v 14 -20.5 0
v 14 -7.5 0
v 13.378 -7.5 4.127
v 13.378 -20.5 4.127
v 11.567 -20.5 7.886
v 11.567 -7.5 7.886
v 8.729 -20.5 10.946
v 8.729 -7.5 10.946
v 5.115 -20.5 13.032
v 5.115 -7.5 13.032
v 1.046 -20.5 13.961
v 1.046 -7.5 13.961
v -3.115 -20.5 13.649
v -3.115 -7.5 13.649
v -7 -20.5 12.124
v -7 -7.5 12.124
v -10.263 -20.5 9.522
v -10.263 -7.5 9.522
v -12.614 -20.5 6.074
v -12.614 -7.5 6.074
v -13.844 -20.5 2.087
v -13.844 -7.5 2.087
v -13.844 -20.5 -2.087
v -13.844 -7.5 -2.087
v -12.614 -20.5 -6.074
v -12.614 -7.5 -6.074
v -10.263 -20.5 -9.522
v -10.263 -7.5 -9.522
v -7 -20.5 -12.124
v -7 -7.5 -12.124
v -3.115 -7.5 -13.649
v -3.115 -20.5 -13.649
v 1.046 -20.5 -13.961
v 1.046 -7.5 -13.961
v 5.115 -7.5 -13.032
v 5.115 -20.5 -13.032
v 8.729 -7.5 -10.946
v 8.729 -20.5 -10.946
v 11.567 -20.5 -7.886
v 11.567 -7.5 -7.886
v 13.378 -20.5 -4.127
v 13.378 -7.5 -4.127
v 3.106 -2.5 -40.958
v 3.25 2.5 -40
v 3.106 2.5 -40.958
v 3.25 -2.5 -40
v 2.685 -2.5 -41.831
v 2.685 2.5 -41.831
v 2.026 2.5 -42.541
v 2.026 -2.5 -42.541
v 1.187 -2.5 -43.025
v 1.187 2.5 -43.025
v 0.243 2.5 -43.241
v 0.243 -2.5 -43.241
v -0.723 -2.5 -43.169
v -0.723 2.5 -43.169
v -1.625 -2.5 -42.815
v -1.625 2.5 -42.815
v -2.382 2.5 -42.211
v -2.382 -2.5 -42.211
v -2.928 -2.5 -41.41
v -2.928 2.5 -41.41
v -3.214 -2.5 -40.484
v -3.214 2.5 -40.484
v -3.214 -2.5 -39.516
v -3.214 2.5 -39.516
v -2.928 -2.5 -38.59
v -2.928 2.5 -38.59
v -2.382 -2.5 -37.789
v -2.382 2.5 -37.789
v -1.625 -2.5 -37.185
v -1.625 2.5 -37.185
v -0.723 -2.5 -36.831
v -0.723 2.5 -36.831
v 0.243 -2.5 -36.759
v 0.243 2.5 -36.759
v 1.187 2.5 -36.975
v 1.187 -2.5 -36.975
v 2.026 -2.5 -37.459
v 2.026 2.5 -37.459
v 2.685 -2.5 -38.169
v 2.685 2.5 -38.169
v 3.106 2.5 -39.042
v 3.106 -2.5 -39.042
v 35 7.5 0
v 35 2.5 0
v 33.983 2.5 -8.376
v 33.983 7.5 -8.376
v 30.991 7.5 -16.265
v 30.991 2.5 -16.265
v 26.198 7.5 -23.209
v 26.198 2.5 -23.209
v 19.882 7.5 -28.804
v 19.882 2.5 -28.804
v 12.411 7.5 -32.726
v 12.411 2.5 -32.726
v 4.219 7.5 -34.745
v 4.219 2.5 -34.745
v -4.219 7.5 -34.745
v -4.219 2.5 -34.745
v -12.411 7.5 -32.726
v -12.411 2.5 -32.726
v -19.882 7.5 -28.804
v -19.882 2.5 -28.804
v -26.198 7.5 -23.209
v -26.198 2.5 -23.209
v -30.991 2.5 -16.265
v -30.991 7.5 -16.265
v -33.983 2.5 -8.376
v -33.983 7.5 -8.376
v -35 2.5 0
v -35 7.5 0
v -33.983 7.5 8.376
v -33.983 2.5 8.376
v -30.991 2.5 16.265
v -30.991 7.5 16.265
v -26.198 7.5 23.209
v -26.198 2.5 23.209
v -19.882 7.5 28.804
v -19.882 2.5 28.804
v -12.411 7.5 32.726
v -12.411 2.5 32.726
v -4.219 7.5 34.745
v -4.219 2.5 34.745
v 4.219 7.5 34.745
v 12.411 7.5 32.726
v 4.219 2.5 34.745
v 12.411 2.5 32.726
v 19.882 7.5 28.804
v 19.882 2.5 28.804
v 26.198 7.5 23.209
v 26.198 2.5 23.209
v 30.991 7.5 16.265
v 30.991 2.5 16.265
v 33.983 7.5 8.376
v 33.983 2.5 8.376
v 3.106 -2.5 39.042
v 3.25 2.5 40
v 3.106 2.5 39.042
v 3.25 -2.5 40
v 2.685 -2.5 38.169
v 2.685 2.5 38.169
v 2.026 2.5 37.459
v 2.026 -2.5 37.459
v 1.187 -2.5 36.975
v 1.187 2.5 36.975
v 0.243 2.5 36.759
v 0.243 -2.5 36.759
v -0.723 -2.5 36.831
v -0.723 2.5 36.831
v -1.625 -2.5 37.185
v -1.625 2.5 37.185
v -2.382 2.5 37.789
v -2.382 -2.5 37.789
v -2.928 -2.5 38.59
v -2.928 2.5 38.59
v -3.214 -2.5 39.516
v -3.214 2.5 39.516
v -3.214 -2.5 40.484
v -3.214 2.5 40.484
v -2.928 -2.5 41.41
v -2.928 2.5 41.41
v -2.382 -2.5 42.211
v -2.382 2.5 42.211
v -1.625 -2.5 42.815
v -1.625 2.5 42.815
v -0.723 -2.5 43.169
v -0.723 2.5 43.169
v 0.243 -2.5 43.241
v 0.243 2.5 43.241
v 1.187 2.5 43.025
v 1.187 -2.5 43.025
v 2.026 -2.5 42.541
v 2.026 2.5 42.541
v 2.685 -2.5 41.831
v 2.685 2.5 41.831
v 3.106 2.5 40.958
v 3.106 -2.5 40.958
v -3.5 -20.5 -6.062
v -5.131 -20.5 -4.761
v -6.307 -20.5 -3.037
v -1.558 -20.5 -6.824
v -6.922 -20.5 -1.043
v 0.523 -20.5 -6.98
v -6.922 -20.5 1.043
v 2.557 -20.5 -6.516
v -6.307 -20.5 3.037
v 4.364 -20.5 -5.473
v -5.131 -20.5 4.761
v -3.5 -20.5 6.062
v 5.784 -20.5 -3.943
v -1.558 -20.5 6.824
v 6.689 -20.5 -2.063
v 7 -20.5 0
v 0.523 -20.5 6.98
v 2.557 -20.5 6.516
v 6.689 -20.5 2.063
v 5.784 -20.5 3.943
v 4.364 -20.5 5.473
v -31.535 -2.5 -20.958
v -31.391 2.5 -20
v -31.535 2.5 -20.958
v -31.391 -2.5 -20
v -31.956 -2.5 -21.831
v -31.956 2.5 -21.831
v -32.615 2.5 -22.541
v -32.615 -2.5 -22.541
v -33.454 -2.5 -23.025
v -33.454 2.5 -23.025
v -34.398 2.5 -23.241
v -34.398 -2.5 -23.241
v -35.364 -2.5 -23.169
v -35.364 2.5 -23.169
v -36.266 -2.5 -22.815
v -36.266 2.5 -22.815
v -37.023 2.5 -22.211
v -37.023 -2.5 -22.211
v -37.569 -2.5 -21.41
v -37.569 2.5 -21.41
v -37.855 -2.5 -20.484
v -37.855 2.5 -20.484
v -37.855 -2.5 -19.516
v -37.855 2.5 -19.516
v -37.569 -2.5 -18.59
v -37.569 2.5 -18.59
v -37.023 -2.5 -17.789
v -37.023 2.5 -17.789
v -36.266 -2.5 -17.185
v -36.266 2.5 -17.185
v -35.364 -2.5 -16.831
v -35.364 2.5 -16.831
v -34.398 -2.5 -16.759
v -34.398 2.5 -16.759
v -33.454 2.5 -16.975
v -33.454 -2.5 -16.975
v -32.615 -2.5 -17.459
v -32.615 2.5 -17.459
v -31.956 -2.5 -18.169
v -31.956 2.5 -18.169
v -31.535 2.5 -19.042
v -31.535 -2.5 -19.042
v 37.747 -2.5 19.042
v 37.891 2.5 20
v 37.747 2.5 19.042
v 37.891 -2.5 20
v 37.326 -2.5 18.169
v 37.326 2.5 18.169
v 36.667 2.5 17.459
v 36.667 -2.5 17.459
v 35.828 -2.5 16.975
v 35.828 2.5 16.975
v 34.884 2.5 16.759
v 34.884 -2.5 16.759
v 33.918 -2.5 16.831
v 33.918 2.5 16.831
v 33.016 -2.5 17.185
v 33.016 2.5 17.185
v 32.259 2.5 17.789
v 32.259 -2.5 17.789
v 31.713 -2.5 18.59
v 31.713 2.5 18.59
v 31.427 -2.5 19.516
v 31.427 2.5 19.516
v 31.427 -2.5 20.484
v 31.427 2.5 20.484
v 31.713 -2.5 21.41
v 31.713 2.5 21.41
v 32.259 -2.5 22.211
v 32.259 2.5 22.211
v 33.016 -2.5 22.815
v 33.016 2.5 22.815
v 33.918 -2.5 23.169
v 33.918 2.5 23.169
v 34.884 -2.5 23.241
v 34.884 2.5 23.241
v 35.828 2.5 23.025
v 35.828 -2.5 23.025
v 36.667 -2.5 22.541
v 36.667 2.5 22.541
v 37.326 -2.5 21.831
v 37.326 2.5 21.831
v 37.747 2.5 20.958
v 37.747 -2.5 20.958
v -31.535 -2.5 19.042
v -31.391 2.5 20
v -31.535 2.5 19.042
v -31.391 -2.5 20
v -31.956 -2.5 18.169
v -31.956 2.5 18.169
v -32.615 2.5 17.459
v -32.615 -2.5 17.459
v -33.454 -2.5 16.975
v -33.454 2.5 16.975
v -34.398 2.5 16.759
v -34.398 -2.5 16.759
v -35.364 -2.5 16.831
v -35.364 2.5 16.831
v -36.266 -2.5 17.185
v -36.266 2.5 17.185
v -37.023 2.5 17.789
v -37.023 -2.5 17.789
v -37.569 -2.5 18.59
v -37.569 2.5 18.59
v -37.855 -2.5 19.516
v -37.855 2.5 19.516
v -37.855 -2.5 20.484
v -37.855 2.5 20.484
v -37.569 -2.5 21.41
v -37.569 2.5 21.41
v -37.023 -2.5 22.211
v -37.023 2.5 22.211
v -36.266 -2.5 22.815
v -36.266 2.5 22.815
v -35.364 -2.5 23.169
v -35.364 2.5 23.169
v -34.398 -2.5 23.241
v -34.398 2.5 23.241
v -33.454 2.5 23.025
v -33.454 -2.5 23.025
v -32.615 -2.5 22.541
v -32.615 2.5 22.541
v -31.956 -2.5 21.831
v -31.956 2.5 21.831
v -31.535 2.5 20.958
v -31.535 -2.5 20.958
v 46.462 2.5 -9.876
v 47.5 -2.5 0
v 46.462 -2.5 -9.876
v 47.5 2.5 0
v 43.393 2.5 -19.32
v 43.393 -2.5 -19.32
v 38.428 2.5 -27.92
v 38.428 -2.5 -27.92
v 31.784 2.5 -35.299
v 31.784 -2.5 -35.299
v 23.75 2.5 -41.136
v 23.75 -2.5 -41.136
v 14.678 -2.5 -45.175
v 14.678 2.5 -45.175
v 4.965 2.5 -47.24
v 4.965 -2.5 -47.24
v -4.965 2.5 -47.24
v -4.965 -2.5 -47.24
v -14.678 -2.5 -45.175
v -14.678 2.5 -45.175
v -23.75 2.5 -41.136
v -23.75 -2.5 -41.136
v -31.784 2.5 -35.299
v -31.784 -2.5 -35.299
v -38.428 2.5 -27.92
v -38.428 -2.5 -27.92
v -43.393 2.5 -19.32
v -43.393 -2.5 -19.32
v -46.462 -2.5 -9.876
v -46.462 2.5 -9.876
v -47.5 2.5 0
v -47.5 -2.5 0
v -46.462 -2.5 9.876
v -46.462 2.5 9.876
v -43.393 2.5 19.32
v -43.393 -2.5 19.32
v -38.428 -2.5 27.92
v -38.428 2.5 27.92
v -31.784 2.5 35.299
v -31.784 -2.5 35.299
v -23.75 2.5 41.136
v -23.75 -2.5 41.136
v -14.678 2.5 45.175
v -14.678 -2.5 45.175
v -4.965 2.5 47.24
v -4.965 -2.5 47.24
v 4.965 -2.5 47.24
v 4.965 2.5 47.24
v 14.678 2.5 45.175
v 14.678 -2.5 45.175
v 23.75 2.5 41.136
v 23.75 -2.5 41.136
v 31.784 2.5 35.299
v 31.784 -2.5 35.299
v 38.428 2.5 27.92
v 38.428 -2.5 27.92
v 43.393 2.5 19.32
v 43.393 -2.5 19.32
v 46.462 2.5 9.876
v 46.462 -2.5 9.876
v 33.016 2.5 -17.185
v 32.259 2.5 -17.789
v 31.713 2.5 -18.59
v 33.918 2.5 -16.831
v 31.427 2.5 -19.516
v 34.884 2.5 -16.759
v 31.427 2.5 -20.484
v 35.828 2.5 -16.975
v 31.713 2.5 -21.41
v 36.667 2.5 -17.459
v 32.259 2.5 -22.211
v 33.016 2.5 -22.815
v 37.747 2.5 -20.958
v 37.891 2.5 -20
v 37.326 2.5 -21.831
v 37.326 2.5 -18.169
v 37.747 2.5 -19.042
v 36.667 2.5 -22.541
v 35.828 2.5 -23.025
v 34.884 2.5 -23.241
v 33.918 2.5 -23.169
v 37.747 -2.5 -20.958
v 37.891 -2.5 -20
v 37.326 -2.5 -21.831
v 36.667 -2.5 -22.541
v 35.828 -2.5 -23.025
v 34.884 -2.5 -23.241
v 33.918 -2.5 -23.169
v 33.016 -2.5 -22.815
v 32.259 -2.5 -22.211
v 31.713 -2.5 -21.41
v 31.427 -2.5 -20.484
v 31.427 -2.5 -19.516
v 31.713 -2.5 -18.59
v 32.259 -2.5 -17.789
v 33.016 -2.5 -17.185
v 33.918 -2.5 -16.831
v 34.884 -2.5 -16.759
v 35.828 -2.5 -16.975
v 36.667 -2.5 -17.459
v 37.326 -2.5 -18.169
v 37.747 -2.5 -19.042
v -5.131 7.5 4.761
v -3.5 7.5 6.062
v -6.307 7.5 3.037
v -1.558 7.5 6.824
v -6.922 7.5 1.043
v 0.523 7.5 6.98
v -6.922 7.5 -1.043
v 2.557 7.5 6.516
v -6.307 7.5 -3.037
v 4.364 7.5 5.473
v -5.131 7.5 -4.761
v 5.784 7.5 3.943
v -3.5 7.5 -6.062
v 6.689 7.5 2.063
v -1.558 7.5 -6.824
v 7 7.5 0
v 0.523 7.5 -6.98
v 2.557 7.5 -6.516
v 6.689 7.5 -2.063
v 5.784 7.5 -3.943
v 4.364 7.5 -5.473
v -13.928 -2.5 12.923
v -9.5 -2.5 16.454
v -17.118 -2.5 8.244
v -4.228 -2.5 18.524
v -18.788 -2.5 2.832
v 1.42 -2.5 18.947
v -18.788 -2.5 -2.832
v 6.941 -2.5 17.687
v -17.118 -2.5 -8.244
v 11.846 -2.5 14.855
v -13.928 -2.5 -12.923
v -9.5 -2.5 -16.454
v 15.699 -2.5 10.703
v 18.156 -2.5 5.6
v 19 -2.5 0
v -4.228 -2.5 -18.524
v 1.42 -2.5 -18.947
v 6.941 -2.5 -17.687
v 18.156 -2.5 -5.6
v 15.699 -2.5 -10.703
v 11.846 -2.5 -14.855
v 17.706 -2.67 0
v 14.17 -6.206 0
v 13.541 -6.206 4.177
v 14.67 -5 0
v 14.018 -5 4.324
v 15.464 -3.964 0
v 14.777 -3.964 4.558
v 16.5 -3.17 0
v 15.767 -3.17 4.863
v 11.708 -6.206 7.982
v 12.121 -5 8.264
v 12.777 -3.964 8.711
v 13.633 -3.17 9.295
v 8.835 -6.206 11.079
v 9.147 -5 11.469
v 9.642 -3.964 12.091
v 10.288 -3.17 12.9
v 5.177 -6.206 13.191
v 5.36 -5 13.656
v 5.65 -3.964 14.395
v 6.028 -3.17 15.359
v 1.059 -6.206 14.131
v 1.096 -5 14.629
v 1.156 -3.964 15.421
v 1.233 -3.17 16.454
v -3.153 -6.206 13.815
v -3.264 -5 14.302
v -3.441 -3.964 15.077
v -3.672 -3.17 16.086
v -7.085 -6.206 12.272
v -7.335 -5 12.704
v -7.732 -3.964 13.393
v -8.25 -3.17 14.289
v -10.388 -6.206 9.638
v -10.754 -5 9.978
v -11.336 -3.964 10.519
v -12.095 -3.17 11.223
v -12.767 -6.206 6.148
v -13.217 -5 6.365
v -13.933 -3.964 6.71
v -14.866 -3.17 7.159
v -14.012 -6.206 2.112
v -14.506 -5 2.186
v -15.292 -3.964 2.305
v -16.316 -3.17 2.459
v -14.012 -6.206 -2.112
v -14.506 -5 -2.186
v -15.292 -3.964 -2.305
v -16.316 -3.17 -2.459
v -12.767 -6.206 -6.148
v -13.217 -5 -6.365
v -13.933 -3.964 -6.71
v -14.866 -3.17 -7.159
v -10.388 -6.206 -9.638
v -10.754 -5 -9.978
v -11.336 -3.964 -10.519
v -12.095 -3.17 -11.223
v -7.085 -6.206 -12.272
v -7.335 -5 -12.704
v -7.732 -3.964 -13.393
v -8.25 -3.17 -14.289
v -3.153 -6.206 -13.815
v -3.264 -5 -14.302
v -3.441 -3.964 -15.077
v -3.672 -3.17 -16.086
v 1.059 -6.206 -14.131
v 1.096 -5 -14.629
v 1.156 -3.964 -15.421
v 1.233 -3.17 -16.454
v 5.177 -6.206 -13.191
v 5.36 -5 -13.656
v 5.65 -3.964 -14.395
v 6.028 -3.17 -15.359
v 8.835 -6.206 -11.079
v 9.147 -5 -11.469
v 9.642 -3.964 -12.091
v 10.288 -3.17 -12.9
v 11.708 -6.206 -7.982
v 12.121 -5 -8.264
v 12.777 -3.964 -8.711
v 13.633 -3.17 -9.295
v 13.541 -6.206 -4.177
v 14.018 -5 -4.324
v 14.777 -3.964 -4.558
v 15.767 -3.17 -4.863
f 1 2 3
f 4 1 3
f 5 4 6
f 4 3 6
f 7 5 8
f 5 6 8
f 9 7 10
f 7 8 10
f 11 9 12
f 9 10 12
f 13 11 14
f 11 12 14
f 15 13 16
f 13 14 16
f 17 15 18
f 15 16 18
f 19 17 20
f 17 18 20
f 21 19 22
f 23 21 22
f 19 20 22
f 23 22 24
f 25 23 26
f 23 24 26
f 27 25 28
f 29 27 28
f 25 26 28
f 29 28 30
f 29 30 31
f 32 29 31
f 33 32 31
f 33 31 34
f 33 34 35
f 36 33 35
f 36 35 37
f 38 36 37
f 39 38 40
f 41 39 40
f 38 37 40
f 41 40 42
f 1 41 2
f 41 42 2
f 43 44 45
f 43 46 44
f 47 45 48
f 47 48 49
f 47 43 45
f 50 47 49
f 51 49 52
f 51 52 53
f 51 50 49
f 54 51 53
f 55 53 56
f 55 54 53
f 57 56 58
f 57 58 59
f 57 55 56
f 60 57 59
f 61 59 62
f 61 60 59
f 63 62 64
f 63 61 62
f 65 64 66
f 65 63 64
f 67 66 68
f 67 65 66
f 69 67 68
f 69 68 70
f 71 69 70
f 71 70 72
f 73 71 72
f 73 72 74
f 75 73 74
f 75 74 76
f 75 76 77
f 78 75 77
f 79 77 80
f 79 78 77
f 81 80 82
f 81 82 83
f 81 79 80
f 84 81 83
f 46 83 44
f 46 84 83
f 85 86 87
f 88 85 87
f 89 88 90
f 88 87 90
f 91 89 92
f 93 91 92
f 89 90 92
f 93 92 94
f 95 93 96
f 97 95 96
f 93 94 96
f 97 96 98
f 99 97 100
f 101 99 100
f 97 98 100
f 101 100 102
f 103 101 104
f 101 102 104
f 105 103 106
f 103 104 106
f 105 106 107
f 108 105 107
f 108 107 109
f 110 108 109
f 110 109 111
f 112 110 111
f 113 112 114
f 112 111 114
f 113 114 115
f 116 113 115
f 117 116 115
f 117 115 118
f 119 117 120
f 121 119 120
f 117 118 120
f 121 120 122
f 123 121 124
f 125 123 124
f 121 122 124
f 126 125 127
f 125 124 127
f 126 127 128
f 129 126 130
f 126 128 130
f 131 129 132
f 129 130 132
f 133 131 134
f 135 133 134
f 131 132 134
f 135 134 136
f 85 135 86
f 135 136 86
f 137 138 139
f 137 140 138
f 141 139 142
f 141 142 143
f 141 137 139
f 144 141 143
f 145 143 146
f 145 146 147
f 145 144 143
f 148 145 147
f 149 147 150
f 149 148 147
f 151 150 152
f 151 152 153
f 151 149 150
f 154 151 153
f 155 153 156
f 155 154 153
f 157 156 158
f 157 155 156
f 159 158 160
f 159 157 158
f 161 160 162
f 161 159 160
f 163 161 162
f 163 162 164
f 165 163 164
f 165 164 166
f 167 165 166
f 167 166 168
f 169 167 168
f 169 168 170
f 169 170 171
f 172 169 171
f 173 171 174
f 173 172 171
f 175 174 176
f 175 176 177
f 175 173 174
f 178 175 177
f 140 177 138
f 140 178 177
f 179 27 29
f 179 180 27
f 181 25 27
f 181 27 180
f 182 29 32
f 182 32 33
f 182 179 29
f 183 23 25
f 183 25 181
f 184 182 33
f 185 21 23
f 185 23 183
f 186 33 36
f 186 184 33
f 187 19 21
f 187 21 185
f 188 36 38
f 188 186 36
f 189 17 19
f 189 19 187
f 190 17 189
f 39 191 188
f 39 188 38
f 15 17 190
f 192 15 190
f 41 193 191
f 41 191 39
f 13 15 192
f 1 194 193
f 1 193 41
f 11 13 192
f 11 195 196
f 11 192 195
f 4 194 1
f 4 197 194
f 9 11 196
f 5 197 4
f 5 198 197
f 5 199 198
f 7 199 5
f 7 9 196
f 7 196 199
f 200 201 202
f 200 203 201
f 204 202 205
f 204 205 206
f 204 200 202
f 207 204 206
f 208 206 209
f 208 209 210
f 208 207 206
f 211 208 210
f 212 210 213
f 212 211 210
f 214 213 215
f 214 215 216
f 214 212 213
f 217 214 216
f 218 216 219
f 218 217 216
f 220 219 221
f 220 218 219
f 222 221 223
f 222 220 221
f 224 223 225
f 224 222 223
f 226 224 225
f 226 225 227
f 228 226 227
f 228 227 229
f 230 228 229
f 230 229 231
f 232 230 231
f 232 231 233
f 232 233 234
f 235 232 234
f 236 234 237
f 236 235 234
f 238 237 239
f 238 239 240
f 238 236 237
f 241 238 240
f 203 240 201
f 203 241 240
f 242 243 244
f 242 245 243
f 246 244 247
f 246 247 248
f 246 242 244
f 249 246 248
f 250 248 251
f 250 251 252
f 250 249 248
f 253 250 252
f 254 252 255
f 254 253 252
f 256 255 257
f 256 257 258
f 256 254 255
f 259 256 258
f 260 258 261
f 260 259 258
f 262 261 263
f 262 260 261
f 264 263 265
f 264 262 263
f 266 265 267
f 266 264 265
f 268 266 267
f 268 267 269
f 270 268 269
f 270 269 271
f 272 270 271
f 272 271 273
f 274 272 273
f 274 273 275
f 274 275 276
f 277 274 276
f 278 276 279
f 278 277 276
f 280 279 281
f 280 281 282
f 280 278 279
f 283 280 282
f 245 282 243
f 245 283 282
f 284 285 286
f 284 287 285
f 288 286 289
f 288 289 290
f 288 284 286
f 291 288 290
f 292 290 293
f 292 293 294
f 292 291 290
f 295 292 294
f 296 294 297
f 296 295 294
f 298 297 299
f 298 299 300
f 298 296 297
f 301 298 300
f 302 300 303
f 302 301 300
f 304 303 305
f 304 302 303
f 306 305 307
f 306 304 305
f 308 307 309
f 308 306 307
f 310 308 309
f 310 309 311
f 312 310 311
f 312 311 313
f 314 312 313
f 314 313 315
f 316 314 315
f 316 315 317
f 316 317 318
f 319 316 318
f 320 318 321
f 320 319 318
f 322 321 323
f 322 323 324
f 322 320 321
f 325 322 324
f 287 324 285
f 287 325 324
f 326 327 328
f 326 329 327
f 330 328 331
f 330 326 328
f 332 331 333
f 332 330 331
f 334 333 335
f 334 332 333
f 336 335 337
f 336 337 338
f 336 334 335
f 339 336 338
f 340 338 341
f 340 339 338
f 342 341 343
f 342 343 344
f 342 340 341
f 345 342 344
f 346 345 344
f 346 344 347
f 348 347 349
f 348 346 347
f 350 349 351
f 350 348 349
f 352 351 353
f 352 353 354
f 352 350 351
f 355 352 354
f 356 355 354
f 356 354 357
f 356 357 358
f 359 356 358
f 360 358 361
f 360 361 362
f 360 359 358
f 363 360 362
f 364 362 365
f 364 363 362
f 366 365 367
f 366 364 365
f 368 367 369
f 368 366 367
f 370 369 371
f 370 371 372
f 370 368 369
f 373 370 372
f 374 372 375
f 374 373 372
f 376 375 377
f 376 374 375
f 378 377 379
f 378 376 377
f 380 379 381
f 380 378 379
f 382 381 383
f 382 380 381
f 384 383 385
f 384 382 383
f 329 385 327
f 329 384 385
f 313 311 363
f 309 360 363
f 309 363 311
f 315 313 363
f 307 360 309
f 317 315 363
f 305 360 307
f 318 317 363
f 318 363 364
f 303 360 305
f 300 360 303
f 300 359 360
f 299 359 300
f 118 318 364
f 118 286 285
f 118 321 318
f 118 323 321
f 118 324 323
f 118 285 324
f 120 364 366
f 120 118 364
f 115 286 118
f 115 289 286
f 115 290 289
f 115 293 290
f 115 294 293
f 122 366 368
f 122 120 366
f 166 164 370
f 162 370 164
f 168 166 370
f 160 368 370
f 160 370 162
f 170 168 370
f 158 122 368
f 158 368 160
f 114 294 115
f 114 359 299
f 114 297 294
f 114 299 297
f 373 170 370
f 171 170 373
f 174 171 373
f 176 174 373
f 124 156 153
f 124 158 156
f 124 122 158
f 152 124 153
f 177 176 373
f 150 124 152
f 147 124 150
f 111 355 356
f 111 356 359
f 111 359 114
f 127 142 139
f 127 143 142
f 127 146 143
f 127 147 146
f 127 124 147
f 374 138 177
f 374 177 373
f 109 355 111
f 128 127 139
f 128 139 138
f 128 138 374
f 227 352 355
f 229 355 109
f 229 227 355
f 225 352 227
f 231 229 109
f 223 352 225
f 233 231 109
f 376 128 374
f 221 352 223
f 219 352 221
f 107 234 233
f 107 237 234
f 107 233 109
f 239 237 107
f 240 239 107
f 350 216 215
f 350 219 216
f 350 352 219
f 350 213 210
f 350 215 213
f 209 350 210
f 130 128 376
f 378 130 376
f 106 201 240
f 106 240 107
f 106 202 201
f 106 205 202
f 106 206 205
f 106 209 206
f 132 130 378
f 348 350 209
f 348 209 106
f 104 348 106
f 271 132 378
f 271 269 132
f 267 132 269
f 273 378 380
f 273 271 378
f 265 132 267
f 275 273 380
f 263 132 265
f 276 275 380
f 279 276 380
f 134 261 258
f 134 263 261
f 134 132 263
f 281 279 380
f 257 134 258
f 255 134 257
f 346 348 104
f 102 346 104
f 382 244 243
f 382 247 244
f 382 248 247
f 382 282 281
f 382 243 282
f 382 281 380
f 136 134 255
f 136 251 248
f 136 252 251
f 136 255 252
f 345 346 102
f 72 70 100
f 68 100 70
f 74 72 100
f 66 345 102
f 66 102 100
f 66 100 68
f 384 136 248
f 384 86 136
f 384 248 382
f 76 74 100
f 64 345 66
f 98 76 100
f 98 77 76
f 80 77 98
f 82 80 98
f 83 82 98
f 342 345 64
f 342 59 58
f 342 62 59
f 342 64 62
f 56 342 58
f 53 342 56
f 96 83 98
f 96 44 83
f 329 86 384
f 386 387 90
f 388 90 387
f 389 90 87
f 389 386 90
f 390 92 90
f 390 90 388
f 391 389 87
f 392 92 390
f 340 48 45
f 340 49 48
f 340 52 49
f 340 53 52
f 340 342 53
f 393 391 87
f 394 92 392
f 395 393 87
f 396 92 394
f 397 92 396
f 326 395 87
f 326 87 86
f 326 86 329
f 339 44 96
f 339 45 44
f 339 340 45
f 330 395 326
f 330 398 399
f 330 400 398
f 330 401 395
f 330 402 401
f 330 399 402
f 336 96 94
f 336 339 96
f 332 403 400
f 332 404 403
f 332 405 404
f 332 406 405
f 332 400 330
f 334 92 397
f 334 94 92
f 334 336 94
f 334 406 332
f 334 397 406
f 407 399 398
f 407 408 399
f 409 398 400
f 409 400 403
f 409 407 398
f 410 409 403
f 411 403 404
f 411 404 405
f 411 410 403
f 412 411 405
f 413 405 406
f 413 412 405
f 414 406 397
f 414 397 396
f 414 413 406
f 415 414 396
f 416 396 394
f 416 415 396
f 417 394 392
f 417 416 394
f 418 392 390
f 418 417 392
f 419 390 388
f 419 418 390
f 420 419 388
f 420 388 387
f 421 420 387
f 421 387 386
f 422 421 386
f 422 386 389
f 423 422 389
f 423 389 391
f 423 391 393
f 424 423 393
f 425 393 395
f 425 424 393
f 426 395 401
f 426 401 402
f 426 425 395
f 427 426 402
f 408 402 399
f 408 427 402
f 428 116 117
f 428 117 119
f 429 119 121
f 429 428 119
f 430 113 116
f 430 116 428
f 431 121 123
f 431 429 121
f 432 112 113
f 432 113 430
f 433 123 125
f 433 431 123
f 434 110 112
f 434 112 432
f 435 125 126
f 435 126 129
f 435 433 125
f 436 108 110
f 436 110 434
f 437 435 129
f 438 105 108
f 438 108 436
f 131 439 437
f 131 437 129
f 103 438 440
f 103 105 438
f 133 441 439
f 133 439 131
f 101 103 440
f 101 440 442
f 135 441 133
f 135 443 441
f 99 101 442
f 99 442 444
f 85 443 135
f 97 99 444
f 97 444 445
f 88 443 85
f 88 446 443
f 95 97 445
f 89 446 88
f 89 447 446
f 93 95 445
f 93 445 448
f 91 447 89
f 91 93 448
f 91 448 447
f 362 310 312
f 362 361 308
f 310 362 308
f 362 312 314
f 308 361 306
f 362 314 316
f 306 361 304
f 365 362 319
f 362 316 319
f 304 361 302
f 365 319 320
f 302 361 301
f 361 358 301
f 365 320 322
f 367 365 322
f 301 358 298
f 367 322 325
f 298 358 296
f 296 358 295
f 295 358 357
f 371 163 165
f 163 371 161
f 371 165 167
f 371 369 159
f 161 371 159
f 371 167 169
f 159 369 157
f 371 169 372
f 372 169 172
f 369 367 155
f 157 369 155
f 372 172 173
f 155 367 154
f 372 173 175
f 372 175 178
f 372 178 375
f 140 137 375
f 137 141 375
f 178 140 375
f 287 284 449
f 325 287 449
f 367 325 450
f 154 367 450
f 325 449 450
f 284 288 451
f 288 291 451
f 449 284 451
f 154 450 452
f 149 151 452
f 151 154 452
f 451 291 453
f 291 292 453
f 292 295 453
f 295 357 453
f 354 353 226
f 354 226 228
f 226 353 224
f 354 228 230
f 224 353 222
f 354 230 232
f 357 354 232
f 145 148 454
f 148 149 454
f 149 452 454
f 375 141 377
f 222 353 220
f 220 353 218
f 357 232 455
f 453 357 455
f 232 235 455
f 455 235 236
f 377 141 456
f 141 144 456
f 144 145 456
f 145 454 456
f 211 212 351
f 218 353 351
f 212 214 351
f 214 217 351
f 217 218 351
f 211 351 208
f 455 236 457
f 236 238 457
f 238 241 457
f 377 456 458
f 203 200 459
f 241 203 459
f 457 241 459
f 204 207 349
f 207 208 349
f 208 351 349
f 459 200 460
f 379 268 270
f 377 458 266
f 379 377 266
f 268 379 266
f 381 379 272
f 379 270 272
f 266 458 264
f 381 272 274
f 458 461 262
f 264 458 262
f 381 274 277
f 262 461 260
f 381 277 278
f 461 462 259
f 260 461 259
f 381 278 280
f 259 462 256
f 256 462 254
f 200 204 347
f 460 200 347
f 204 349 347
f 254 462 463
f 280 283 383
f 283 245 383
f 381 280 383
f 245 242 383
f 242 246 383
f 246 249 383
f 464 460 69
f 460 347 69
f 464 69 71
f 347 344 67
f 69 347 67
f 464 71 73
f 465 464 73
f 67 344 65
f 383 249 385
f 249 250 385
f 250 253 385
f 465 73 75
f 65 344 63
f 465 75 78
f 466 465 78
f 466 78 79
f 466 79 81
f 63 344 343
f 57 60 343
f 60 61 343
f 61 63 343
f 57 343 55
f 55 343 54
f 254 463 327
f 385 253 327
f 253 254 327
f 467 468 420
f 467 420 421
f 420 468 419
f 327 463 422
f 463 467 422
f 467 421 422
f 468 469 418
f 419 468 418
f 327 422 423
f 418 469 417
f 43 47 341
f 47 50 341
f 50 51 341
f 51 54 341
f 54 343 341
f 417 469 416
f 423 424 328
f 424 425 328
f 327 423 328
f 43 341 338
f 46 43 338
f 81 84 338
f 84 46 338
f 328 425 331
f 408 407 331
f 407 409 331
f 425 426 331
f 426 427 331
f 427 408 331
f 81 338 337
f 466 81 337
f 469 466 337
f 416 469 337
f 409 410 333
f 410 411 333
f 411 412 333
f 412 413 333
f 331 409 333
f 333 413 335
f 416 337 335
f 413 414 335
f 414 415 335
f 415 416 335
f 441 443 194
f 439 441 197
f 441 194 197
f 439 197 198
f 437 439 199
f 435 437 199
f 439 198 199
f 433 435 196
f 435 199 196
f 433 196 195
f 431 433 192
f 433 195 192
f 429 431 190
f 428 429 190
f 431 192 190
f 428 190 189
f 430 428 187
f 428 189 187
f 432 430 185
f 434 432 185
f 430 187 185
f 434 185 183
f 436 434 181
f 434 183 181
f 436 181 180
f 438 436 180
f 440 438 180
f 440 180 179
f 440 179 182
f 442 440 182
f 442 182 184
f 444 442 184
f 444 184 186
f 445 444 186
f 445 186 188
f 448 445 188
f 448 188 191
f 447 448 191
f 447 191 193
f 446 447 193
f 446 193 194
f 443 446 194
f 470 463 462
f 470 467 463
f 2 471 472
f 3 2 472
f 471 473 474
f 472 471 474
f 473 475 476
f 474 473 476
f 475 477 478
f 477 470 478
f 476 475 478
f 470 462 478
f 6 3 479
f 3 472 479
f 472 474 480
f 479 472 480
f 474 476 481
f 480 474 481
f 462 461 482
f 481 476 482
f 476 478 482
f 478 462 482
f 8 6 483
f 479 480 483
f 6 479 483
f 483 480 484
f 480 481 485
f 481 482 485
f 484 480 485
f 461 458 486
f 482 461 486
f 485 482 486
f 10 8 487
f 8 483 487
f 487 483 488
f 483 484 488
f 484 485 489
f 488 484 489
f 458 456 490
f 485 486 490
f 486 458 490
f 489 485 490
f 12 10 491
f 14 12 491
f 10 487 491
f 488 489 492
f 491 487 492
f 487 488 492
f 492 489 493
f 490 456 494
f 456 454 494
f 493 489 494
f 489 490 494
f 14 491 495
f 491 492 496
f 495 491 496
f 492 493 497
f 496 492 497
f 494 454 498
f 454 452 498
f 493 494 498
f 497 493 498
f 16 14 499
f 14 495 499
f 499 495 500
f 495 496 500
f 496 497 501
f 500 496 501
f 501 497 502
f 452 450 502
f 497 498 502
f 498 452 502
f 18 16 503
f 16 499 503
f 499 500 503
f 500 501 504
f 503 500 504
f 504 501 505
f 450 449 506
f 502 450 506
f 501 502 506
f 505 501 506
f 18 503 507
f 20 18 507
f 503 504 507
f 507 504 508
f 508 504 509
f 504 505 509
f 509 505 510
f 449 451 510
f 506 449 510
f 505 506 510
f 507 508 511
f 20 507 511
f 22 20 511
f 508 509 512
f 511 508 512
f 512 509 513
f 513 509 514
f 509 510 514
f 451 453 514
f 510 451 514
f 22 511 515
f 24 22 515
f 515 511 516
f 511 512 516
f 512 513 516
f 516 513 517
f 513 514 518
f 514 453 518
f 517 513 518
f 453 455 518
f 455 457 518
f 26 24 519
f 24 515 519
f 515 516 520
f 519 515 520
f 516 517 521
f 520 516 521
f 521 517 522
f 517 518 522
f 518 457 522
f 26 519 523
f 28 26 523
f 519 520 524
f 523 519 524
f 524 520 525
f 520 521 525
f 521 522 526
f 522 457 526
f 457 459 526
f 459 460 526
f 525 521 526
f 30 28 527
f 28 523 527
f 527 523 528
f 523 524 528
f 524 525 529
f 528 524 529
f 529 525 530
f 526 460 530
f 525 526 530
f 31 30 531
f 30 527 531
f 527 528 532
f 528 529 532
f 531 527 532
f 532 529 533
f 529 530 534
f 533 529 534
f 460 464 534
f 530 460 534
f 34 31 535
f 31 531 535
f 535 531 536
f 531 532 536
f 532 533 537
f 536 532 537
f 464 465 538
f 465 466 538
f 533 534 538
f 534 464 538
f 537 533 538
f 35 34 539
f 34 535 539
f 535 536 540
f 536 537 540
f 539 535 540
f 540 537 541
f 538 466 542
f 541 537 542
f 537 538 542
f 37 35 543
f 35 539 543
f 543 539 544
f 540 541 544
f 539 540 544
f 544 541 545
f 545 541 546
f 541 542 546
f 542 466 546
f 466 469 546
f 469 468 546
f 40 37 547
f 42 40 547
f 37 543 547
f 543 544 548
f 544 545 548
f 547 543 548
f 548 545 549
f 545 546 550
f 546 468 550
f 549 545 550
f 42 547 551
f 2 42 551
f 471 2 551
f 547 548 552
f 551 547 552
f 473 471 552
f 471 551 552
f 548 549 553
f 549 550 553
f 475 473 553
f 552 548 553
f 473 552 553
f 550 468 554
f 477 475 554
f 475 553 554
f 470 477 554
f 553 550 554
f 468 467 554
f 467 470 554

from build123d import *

# Parameters (mm, degrees)
SKETCH2_R               = 47.5
SKETCH2_R_2             = 3.25
BOSS_EXTRUDE1_DEPTH     = 2.5
SKETCH3_R               = 7
CUT_EXTRUDE1_DEPTH      = 5
SKETCH4_R               = 35
BOSS_EXTRUDE2_DEPTH     = 5
SKETCH5_R               = 14
BOSS_EXTRUDE3_DEPTH     = 18
SKETCH6_R               = 7
CUT_EXTRUDE2_DEPTH      = 1
CUT_EXTRUDE2_DEPTH_BACK = 29
FILLET1_R               = 5


with BuildPart() as part:
    # Sketch2 → Boss-Extrude1 (new body, symmetric)
    with BuildSketch(Plane(origin=(0, 0, 0), x_dir=(1, 0, 0), z_dir=(0, 1, 0))):
        Circle(SKETCH2_R)
        with Locations((0, 40)):
            Circle(SKETCH2_R_2, mode=Mode.SUBTRACT)
        with Locations((34.641016151, 20)):
            Circle(SKETCH2_R_2, mode=Mode.SUBTRACT)
        with Locations((34.641016151, -20)):
            Circle(SKETCH2_R_2, mode=Mode.SUBTRACT)
        with Locations((0, -40)):
            Circle(SKETCH2_R_2, mode=Mode.SUBTRACT)
        with Locations((-34.641016151, -20)):
            Circle(SKETCH2_R_2, mode=Mode.SUBTRACT)
        with Locations((-34.641016151, 20)):
            Circle(SKETCH2_R_2, mode=Mode.SUBTRACT)
    extrude(amount=BOSS_EXTRUDE1_DEPTH, both=True)

    # Sketch3 → Cut-Extrude1 (cut)
    with BuildSketch(Plane(origin=(0, 2.5, 0), x_dir=(1, 0, 0), z_dir=(0, 1, 0))):
        Circle(SKETCH3_R)
    extrude(amount=-CUT_EXTRUDE1_DEPTH, mode=Mode.SUBTRACT)

    # Sketch4 → Boss-Extrude2 (add)
    with BuildSketch(Plane(origin=(0, 2.5, 0), x_dir=(1, 0, 0), z_dir=(0, 1, 0))):
        Circle(SKETCH4_R)
    extrude(amount=BOSS_EXTRUDE2_DEPTH)

    # Sketch5 → Boss-Extrude3 (add)
    with BuildSketch(Plane.XZ.offset(2.5)):
        Circle(SKETCH5_R)
    extrude(amount=BOSS_EXTRUDE3_DEPTH)

    # Sketch6 → Cut-Extrude2 (cut, two sides)
    with BuildSketch(Plane.XZ.offset(20.5)) as cut_extrude2_sk:
        Circle(SKETCH6_R)
    extrude(amount=CUT_EXTRUDE2_DEPTH, mode=Mode.SUBTRACT)
    extrude(cut_extrude2_sk.sketch, amount=-CUT_EXTRUDE2_DEPTH_BACK, mode=Mode.SUBTRACT)

    # Fillet1
    fillet1_edges = [part.edges().sort_by_distance(p)[0] for p in [
        (-14, -2.5, 0),
    ]]
    fillet(fillet1_edges, radius=FILLET1_R)


solid = part.part
